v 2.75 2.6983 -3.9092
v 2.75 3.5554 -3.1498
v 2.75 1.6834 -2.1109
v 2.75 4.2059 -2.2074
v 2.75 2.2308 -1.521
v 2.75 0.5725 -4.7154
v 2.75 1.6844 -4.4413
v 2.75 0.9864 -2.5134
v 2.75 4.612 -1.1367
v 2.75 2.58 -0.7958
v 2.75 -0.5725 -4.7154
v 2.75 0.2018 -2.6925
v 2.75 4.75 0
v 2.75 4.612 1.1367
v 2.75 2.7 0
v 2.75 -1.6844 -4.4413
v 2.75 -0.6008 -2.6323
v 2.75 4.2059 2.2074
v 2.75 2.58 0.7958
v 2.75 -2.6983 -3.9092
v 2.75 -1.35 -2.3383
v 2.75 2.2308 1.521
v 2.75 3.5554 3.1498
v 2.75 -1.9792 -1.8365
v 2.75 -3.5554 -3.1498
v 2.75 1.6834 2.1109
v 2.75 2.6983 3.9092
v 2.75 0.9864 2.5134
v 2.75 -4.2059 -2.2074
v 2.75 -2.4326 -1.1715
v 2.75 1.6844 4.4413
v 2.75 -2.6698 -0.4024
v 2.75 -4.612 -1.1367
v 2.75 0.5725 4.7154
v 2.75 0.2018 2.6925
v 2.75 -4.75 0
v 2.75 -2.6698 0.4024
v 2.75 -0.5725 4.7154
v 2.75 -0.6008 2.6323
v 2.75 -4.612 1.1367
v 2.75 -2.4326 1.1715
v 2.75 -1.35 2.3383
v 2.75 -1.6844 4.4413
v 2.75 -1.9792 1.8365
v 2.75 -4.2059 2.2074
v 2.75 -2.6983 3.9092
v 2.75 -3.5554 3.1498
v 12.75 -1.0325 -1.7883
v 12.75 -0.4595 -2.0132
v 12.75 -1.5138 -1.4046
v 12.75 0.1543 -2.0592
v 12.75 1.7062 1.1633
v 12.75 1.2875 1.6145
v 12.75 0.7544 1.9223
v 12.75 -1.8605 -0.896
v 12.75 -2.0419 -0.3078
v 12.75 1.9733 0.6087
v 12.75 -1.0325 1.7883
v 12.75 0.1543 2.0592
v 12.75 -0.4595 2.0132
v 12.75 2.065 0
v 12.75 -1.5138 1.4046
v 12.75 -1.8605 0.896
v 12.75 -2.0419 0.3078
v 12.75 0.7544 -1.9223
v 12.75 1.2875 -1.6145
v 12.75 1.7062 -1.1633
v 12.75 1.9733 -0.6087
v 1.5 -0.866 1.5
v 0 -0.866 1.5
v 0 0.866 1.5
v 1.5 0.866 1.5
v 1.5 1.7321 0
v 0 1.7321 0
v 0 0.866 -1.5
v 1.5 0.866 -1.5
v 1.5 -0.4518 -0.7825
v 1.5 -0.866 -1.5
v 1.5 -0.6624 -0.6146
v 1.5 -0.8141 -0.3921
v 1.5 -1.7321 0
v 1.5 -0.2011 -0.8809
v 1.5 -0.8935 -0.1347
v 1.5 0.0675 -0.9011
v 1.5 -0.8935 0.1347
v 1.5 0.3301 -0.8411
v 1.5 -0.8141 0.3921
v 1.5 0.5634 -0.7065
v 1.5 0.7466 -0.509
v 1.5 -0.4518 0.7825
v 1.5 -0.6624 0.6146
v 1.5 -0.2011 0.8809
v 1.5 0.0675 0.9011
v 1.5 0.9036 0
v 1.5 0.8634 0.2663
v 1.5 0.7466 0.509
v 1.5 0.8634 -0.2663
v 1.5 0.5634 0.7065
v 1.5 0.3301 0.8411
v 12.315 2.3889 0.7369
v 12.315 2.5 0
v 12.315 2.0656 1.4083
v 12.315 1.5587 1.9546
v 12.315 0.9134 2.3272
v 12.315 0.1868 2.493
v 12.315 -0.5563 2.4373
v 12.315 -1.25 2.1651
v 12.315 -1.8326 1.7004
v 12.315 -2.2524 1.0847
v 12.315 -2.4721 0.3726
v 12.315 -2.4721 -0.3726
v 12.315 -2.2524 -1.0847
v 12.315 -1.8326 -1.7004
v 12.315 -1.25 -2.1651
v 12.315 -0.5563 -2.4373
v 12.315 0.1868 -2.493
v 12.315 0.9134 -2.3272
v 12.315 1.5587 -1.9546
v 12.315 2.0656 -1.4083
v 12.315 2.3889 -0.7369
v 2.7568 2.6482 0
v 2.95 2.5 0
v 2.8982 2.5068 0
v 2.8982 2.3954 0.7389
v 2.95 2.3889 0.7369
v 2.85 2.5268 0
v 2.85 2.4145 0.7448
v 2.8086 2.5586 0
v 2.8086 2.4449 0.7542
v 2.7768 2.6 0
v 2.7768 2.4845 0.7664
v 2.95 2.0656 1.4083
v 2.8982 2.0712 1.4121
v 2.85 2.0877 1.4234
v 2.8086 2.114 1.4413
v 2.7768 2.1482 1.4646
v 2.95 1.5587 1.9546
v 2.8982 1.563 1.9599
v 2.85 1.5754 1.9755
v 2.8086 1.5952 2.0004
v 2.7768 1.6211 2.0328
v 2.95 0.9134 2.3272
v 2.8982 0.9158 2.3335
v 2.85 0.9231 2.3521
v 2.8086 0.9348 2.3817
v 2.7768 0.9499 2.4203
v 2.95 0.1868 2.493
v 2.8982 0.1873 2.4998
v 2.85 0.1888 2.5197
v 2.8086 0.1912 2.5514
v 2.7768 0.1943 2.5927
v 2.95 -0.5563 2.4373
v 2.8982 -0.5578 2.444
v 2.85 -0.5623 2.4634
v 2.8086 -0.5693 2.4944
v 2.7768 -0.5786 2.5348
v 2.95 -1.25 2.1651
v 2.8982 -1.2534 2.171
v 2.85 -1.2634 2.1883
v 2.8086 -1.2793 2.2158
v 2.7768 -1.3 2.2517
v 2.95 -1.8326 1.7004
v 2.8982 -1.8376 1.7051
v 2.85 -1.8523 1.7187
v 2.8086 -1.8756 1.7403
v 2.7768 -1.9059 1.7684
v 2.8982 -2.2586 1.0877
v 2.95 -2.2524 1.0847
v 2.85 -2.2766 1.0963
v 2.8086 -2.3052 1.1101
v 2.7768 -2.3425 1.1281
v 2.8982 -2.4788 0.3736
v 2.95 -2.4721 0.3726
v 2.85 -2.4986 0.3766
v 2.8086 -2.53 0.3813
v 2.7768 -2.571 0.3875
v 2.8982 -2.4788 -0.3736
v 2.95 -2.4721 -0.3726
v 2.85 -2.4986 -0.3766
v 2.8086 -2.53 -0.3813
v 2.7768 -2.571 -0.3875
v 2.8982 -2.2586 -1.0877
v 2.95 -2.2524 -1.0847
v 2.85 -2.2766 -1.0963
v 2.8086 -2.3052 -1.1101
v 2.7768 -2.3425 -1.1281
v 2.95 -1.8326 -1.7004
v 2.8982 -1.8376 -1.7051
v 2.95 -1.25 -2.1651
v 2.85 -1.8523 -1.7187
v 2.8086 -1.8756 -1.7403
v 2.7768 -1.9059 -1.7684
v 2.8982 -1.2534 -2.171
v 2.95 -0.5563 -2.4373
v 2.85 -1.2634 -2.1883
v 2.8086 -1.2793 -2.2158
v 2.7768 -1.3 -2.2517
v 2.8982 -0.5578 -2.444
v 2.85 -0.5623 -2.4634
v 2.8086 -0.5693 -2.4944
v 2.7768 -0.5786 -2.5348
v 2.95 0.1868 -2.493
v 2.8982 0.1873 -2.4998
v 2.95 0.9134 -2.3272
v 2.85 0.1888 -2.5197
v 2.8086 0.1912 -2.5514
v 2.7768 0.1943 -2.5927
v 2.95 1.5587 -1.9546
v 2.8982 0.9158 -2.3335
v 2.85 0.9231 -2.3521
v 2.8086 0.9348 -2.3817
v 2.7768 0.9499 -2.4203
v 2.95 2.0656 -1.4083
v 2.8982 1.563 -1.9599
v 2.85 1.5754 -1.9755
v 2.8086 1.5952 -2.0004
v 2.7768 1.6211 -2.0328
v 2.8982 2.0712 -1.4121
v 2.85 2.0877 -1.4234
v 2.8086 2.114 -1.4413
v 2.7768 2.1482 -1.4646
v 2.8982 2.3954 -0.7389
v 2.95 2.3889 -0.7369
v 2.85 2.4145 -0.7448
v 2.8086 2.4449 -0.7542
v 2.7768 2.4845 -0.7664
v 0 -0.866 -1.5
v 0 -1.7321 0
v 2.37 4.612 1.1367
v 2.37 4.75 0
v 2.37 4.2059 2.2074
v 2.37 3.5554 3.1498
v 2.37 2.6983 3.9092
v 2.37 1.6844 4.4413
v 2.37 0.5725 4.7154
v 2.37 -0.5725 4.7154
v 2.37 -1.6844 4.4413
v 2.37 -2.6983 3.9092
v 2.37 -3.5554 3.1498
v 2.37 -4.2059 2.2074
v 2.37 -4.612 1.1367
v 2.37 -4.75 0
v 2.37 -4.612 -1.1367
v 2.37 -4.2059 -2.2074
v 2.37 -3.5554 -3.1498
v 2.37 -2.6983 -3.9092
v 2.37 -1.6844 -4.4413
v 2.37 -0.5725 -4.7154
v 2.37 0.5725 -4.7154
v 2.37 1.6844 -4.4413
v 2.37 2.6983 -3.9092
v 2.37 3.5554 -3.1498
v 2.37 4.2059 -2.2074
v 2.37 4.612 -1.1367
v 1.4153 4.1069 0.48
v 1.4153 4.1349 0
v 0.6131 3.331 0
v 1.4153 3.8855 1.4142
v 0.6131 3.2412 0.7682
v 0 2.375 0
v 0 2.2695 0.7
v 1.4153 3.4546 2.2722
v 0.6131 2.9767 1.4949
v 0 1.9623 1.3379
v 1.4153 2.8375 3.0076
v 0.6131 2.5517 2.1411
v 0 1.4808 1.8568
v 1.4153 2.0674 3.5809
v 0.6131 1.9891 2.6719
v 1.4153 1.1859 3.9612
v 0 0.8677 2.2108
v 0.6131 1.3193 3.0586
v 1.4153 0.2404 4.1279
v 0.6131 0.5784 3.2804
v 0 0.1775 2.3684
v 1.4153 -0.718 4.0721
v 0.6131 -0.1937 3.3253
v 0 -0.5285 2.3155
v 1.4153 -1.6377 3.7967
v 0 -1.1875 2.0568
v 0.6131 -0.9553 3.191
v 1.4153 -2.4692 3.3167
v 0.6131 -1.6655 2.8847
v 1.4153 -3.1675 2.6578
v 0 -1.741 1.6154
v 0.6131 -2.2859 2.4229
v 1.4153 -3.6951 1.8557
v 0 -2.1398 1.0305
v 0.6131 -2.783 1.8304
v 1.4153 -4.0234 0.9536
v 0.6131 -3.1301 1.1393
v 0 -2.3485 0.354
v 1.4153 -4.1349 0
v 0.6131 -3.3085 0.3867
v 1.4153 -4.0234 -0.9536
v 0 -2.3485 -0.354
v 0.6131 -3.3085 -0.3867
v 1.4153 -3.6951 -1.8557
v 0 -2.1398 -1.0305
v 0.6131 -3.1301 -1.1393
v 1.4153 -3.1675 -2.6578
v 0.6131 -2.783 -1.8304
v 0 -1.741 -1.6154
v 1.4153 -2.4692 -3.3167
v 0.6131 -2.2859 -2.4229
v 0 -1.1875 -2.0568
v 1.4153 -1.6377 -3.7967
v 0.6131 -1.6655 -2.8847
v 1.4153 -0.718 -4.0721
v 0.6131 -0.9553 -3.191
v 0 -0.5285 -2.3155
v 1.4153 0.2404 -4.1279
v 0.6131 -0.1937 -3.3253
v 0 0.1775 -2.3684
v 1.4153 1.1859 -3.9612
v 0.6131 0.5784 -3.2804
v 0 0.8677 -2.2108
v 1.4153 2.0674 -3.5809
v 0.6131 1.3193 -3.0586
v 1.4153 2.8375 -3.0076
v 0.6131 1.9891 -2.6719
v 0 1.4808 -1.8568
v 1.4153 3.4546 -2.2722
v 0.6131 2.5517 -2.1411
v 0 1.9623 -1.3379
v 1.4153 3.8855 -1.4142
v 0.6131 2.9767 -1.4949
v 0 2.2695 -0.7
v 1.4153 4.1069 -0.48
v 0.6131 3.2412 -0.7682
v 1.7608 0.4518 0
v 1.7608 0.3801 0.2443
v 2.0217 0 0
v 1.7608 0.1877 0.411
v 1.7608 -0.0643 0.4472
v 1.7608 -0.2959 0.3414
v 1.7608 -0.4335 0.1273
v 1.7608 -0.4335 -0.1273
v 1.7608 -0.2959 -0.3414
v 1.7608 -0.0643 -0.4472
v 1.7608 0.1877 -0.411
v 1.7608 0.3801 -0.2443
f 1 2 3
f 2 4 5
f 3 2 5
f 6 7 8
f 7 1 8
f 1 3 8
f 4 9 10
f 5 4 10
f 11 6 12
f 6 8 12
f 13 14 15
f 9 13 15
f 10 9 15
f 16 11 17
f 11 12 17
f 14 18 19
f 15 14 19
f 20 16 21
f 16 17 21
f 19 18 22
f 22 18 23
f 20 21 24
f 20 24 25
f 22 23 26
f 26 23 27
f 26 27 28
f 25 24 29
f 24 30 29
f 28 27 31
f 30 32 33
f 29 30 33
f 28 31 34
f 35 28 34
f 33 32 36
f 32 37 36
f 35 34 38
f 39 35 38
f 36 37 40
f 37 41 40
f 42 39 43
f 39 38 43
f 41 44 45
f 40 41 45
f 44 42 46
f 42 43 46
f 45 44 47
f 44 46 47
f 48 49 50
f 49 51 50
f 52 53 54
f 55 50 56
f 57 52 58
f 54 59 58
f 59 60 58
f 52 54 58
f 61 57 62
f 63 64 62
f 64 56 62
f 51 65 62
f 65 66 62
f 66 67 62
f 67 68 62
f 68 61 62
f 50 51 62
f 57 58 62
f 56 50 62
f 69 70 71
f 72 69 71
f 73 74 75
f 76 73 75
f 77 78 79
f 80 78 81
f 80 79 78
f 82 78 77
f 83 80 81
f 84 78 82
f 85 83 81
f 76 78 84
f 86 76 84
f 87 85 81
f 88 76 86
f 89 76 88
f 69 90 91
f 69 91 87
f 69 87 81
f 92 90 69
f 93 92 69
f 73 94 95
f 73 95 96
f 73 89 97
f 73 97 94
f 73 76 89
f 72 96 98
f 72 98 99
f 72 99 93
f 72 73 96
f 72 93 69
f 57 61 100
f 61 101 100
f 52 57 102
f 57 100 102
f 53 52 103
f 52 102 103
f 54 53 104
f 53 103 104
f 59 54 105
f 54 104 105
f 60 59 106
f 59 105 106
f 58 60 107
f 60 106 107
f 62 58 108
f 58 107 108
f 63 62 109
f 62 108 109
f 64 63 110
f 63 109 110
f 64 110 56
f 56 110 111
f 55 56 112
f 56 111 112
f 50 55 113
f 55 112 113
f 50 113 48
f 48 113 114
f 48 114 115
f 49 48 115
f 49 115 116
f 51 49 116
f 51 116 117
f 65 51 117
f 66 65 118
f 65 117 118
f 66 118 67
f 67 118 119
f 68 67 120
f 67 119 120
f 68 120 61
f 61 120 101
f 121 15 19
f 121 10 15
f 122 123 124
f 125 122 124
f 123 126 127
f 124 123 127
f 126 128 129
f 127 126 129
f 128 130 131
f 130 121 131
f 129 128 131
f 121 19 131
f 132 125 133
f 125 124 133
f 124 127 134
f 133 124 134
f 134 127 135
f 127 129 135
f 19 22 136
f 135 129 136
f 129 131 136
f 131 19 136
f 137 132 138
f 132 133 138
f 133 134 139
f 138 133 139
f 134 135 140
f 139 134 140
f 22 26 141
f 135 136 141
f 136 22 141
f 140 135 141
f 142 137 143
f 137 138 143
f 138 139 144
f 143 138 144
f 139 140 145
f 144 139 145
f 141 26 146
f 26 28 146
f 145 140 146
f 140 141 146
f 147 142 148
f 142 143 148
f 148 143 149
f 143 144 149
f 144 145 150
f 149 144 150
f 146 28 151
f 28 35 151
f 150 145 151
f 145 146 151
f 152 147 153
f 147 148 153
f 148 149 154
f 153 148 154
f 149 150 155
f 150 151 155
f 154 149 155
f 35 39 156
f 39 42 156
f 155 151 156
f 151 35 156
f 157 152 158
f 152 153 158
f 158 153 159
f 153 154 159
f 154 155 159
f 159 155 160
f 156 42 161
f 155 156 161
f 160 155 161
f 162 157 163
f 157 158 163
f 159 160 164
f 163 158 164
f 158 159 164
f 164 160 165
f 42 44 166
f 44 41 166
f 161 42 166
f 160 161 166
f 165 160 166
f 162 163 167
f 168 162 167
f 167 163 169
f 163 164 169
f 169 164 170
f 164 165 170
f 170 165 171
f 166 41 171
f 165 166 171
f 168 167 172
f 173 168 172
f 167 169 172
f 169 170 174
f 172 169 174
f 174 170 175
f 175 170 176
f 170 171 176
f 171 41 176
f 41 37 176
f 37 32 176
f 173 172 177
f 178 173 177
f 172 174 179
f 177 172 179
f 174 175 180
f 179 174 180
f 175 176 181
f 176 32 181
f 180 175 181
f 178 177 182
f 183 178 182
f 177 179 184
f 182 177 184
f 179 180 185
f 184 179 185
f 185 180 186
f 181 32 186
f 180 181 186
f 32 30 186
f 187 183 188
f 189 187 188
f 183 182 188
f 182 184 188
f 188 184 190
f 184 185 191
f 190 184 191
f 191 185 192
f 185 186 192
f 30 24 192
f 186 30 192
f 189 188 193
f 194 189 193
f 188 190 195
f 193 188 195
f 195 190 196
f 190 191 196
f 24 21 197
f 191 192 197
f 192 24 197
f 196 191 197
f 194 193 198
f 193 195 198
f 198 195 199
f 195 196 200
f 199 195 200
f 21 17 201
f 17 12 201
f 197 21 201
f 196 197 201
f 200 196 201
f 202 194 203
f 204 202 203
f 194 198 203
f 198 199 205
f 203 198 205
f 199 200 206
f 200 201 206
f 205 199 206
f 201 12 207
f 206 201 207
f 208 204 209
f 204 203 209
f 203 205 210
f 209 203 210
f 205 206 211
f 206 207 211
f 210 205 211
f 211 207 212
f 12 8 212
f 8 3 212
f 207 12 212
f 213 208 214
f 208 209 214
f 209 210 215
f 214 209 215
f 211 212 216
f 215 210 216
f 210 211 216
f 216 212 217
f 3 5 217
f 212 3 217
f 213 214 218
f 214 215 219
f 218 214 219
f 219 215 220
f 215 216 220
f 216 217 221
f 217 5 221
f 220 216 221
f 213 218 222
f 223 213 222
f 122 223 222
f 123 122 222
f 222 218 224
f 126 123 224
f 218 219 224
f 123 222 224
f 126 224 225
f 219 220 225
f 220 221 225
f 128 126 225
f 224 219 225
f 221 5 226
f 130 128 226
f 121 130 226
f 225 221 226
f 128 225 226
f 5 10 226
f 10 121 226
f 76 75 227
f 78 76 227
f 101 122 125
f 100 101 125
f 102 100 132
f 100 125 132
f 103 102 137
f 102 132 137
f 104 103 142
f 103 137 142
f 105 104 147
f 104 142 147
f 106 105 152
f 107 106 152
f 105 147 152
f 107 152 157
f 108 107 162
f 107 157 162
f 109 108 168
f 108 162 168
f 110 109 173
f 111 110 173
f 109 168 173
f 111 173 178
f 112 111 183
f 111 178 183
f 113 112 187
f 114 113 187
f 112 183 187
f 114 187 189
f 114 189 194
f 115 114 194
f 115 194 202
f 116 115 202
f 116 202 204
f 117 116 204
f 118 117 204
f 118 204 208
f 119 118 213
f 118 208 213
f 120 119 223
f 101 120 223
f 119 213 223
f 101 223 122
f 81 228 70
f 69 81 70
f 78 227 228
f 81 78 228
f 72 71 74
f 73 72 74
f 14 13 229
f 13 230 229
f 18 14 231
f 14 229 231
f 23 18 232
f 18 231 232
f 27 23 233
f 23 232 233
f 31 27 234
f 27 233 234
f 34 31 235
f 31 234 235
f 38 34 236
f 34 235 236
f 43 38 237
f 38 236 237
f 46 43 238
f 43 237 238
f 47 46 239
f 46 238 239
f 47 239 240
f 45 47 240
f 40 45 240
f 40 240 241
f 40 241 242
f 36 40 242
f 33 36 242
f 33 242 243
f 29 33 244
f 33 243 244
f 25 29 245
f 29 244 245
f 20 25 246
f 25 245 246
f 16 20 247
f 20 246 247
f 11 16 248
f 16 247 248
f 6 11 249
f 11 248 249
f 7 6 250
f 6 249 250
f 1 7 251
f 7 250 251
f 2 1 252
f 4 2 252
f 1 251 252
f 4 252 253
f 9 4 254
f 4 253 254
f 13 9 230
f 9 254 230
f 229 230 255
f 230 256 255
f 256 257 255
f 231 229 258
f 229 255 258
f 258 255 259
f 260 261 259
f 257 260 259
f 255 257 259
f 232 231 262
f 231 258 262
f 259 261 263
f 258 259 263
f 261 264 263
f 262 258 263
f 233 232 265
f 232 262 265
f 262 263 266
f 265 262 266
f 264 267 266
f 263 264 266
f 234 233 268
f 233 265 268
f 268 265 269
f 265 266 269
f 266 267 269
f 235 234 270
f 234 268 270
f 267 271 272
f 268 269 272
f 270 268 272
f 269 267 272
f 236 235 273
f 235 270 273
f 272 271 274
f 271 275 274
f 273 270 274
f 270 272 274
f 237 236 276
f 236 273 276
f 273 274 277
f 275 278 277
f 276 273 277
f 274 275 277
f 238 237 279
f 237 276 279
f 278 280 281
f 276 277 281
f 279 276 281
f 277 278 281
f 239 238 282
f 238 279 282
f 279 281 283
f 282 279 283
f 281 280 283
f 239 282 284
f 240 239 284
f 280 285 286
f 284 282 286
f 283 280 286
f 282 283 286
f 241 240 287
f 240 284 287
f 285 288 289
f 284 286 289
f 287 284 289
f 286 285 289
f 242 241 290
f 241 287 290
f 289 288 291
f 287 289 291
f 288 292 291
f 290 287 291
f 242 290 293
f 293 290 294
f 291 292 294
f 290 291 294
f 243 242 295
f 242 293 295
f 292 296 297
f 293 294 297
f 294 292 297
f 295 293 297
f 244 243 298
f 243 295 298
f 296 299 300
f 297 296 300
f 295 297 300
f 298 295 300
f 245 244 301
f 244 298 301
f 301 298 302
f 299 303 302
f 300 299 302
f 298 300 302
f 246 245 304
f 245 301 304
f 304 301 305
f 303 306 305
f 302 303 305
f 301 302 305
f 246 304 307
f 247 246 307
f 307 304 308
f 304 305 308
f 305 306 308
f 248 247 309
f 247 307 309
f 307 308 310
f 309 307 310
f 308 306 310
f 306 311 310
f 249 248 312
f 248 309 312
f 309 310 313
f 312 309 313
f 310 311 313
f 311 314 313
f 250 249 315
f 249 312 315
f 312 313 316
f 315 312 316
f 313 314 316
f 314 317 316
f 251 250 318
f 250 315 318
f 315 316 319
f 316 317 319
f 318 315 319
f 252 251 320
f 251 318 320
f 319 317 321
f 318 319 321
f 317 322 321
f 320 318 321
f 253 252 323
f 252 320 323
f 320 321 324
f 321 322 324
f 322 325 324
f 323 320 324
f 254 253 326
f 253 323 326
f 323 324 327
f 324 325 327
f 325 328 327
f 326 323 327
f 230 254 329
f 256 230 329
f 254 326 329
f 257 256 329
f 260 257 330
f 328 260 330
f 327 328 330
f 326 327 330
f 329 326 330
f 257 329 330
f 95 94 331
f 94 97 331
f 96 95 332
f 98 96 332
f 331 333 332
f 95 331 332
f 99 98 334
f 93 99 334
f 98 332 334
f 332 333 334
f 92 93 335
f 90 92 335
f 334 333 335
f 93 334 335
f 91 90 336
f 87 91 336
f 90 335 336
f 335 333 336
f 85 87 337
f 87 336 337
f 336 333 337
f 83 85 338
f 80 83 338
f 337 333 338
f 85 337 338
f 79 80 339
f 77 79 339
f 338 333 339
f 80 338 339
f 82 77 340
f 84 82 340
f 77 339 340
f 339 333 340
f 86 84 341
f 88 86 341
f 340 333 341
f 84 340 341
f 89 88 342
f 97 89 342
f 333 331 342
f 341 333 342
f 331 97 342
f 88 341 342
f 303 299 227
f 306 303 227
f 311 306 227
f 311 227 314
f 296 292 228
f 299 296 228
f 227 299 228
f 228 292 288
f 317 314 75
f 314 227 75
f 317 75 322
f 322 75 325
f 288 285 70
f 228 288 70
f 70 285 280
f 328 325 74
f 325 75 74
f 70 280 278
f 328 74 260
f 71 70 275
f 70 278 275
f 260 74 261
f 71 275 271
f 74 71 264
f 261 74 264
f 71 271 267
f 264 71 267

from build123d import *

# Parameters (mm, degrees)
FILLET1_R   = 0.2
HEX_2_DEPTH = 1.5


with BuildPart() as part:
    # BodySke → BaseBody (revolve)
    with BuildSketch(Plane.XY):
        with BuildLine():
            Line((12.75, 0), (12.75, 2.065))
            Line((12.75, 2.065), (12.315, 2.5))
            Line((12.315, 2.5), (2.75, 2.5))
            Line((2.75, 2.5), (2.75, 4.75))
            Line((2.75, 4.75), (2.37, 4.75))
            ThreePointArc((2.37, 4.75), (0.992680215, 3.754414901), (0, 2.375))
            Line((0, 2.375), (0, 0))
            Line((0, 0), (12.75, 0))
        make_face()
    revolve(axis=Axis((0, 0, 0), (1, 0, 0)))

    # Fillet1
    fillet1_edges = [part.edges().sort_by_distance(p)[0] for p in [
        (2.75, -2.5, 0),
    ]]
    fillet(fillet1_edges, radius=FILLET1_R)

    # Sketch2 → PreBroach (revolve, cut)
    with BuildSketch(Plane.XY):
        Polygon((0, 1.25), (1.3, 1.25), (2.021687836, 0), (0, 0), align=None)
    revolve(axis=Axis((0, 0, 0), (1, 0, 0)), mode=Mode.SUBTRACT)

    # Sketch3 → Hex 2 (cut)
    with BuildSketch(Plane(origin=(0, 0, 0), x_dir=(0, 0, -1), z_dir=(1, 0, 0))):
        Polygon((-1.5, -0.866025404), (-1.5, 0.866025404), (0, 1.732050808), (1.5, 0.866025404), (1.5, -0.866025404), (0, -1.732050808), align=None)
    extrude(amount=HEX_2_DEPTH, mode=Mode.SUBTRACT)


solid = part.part
